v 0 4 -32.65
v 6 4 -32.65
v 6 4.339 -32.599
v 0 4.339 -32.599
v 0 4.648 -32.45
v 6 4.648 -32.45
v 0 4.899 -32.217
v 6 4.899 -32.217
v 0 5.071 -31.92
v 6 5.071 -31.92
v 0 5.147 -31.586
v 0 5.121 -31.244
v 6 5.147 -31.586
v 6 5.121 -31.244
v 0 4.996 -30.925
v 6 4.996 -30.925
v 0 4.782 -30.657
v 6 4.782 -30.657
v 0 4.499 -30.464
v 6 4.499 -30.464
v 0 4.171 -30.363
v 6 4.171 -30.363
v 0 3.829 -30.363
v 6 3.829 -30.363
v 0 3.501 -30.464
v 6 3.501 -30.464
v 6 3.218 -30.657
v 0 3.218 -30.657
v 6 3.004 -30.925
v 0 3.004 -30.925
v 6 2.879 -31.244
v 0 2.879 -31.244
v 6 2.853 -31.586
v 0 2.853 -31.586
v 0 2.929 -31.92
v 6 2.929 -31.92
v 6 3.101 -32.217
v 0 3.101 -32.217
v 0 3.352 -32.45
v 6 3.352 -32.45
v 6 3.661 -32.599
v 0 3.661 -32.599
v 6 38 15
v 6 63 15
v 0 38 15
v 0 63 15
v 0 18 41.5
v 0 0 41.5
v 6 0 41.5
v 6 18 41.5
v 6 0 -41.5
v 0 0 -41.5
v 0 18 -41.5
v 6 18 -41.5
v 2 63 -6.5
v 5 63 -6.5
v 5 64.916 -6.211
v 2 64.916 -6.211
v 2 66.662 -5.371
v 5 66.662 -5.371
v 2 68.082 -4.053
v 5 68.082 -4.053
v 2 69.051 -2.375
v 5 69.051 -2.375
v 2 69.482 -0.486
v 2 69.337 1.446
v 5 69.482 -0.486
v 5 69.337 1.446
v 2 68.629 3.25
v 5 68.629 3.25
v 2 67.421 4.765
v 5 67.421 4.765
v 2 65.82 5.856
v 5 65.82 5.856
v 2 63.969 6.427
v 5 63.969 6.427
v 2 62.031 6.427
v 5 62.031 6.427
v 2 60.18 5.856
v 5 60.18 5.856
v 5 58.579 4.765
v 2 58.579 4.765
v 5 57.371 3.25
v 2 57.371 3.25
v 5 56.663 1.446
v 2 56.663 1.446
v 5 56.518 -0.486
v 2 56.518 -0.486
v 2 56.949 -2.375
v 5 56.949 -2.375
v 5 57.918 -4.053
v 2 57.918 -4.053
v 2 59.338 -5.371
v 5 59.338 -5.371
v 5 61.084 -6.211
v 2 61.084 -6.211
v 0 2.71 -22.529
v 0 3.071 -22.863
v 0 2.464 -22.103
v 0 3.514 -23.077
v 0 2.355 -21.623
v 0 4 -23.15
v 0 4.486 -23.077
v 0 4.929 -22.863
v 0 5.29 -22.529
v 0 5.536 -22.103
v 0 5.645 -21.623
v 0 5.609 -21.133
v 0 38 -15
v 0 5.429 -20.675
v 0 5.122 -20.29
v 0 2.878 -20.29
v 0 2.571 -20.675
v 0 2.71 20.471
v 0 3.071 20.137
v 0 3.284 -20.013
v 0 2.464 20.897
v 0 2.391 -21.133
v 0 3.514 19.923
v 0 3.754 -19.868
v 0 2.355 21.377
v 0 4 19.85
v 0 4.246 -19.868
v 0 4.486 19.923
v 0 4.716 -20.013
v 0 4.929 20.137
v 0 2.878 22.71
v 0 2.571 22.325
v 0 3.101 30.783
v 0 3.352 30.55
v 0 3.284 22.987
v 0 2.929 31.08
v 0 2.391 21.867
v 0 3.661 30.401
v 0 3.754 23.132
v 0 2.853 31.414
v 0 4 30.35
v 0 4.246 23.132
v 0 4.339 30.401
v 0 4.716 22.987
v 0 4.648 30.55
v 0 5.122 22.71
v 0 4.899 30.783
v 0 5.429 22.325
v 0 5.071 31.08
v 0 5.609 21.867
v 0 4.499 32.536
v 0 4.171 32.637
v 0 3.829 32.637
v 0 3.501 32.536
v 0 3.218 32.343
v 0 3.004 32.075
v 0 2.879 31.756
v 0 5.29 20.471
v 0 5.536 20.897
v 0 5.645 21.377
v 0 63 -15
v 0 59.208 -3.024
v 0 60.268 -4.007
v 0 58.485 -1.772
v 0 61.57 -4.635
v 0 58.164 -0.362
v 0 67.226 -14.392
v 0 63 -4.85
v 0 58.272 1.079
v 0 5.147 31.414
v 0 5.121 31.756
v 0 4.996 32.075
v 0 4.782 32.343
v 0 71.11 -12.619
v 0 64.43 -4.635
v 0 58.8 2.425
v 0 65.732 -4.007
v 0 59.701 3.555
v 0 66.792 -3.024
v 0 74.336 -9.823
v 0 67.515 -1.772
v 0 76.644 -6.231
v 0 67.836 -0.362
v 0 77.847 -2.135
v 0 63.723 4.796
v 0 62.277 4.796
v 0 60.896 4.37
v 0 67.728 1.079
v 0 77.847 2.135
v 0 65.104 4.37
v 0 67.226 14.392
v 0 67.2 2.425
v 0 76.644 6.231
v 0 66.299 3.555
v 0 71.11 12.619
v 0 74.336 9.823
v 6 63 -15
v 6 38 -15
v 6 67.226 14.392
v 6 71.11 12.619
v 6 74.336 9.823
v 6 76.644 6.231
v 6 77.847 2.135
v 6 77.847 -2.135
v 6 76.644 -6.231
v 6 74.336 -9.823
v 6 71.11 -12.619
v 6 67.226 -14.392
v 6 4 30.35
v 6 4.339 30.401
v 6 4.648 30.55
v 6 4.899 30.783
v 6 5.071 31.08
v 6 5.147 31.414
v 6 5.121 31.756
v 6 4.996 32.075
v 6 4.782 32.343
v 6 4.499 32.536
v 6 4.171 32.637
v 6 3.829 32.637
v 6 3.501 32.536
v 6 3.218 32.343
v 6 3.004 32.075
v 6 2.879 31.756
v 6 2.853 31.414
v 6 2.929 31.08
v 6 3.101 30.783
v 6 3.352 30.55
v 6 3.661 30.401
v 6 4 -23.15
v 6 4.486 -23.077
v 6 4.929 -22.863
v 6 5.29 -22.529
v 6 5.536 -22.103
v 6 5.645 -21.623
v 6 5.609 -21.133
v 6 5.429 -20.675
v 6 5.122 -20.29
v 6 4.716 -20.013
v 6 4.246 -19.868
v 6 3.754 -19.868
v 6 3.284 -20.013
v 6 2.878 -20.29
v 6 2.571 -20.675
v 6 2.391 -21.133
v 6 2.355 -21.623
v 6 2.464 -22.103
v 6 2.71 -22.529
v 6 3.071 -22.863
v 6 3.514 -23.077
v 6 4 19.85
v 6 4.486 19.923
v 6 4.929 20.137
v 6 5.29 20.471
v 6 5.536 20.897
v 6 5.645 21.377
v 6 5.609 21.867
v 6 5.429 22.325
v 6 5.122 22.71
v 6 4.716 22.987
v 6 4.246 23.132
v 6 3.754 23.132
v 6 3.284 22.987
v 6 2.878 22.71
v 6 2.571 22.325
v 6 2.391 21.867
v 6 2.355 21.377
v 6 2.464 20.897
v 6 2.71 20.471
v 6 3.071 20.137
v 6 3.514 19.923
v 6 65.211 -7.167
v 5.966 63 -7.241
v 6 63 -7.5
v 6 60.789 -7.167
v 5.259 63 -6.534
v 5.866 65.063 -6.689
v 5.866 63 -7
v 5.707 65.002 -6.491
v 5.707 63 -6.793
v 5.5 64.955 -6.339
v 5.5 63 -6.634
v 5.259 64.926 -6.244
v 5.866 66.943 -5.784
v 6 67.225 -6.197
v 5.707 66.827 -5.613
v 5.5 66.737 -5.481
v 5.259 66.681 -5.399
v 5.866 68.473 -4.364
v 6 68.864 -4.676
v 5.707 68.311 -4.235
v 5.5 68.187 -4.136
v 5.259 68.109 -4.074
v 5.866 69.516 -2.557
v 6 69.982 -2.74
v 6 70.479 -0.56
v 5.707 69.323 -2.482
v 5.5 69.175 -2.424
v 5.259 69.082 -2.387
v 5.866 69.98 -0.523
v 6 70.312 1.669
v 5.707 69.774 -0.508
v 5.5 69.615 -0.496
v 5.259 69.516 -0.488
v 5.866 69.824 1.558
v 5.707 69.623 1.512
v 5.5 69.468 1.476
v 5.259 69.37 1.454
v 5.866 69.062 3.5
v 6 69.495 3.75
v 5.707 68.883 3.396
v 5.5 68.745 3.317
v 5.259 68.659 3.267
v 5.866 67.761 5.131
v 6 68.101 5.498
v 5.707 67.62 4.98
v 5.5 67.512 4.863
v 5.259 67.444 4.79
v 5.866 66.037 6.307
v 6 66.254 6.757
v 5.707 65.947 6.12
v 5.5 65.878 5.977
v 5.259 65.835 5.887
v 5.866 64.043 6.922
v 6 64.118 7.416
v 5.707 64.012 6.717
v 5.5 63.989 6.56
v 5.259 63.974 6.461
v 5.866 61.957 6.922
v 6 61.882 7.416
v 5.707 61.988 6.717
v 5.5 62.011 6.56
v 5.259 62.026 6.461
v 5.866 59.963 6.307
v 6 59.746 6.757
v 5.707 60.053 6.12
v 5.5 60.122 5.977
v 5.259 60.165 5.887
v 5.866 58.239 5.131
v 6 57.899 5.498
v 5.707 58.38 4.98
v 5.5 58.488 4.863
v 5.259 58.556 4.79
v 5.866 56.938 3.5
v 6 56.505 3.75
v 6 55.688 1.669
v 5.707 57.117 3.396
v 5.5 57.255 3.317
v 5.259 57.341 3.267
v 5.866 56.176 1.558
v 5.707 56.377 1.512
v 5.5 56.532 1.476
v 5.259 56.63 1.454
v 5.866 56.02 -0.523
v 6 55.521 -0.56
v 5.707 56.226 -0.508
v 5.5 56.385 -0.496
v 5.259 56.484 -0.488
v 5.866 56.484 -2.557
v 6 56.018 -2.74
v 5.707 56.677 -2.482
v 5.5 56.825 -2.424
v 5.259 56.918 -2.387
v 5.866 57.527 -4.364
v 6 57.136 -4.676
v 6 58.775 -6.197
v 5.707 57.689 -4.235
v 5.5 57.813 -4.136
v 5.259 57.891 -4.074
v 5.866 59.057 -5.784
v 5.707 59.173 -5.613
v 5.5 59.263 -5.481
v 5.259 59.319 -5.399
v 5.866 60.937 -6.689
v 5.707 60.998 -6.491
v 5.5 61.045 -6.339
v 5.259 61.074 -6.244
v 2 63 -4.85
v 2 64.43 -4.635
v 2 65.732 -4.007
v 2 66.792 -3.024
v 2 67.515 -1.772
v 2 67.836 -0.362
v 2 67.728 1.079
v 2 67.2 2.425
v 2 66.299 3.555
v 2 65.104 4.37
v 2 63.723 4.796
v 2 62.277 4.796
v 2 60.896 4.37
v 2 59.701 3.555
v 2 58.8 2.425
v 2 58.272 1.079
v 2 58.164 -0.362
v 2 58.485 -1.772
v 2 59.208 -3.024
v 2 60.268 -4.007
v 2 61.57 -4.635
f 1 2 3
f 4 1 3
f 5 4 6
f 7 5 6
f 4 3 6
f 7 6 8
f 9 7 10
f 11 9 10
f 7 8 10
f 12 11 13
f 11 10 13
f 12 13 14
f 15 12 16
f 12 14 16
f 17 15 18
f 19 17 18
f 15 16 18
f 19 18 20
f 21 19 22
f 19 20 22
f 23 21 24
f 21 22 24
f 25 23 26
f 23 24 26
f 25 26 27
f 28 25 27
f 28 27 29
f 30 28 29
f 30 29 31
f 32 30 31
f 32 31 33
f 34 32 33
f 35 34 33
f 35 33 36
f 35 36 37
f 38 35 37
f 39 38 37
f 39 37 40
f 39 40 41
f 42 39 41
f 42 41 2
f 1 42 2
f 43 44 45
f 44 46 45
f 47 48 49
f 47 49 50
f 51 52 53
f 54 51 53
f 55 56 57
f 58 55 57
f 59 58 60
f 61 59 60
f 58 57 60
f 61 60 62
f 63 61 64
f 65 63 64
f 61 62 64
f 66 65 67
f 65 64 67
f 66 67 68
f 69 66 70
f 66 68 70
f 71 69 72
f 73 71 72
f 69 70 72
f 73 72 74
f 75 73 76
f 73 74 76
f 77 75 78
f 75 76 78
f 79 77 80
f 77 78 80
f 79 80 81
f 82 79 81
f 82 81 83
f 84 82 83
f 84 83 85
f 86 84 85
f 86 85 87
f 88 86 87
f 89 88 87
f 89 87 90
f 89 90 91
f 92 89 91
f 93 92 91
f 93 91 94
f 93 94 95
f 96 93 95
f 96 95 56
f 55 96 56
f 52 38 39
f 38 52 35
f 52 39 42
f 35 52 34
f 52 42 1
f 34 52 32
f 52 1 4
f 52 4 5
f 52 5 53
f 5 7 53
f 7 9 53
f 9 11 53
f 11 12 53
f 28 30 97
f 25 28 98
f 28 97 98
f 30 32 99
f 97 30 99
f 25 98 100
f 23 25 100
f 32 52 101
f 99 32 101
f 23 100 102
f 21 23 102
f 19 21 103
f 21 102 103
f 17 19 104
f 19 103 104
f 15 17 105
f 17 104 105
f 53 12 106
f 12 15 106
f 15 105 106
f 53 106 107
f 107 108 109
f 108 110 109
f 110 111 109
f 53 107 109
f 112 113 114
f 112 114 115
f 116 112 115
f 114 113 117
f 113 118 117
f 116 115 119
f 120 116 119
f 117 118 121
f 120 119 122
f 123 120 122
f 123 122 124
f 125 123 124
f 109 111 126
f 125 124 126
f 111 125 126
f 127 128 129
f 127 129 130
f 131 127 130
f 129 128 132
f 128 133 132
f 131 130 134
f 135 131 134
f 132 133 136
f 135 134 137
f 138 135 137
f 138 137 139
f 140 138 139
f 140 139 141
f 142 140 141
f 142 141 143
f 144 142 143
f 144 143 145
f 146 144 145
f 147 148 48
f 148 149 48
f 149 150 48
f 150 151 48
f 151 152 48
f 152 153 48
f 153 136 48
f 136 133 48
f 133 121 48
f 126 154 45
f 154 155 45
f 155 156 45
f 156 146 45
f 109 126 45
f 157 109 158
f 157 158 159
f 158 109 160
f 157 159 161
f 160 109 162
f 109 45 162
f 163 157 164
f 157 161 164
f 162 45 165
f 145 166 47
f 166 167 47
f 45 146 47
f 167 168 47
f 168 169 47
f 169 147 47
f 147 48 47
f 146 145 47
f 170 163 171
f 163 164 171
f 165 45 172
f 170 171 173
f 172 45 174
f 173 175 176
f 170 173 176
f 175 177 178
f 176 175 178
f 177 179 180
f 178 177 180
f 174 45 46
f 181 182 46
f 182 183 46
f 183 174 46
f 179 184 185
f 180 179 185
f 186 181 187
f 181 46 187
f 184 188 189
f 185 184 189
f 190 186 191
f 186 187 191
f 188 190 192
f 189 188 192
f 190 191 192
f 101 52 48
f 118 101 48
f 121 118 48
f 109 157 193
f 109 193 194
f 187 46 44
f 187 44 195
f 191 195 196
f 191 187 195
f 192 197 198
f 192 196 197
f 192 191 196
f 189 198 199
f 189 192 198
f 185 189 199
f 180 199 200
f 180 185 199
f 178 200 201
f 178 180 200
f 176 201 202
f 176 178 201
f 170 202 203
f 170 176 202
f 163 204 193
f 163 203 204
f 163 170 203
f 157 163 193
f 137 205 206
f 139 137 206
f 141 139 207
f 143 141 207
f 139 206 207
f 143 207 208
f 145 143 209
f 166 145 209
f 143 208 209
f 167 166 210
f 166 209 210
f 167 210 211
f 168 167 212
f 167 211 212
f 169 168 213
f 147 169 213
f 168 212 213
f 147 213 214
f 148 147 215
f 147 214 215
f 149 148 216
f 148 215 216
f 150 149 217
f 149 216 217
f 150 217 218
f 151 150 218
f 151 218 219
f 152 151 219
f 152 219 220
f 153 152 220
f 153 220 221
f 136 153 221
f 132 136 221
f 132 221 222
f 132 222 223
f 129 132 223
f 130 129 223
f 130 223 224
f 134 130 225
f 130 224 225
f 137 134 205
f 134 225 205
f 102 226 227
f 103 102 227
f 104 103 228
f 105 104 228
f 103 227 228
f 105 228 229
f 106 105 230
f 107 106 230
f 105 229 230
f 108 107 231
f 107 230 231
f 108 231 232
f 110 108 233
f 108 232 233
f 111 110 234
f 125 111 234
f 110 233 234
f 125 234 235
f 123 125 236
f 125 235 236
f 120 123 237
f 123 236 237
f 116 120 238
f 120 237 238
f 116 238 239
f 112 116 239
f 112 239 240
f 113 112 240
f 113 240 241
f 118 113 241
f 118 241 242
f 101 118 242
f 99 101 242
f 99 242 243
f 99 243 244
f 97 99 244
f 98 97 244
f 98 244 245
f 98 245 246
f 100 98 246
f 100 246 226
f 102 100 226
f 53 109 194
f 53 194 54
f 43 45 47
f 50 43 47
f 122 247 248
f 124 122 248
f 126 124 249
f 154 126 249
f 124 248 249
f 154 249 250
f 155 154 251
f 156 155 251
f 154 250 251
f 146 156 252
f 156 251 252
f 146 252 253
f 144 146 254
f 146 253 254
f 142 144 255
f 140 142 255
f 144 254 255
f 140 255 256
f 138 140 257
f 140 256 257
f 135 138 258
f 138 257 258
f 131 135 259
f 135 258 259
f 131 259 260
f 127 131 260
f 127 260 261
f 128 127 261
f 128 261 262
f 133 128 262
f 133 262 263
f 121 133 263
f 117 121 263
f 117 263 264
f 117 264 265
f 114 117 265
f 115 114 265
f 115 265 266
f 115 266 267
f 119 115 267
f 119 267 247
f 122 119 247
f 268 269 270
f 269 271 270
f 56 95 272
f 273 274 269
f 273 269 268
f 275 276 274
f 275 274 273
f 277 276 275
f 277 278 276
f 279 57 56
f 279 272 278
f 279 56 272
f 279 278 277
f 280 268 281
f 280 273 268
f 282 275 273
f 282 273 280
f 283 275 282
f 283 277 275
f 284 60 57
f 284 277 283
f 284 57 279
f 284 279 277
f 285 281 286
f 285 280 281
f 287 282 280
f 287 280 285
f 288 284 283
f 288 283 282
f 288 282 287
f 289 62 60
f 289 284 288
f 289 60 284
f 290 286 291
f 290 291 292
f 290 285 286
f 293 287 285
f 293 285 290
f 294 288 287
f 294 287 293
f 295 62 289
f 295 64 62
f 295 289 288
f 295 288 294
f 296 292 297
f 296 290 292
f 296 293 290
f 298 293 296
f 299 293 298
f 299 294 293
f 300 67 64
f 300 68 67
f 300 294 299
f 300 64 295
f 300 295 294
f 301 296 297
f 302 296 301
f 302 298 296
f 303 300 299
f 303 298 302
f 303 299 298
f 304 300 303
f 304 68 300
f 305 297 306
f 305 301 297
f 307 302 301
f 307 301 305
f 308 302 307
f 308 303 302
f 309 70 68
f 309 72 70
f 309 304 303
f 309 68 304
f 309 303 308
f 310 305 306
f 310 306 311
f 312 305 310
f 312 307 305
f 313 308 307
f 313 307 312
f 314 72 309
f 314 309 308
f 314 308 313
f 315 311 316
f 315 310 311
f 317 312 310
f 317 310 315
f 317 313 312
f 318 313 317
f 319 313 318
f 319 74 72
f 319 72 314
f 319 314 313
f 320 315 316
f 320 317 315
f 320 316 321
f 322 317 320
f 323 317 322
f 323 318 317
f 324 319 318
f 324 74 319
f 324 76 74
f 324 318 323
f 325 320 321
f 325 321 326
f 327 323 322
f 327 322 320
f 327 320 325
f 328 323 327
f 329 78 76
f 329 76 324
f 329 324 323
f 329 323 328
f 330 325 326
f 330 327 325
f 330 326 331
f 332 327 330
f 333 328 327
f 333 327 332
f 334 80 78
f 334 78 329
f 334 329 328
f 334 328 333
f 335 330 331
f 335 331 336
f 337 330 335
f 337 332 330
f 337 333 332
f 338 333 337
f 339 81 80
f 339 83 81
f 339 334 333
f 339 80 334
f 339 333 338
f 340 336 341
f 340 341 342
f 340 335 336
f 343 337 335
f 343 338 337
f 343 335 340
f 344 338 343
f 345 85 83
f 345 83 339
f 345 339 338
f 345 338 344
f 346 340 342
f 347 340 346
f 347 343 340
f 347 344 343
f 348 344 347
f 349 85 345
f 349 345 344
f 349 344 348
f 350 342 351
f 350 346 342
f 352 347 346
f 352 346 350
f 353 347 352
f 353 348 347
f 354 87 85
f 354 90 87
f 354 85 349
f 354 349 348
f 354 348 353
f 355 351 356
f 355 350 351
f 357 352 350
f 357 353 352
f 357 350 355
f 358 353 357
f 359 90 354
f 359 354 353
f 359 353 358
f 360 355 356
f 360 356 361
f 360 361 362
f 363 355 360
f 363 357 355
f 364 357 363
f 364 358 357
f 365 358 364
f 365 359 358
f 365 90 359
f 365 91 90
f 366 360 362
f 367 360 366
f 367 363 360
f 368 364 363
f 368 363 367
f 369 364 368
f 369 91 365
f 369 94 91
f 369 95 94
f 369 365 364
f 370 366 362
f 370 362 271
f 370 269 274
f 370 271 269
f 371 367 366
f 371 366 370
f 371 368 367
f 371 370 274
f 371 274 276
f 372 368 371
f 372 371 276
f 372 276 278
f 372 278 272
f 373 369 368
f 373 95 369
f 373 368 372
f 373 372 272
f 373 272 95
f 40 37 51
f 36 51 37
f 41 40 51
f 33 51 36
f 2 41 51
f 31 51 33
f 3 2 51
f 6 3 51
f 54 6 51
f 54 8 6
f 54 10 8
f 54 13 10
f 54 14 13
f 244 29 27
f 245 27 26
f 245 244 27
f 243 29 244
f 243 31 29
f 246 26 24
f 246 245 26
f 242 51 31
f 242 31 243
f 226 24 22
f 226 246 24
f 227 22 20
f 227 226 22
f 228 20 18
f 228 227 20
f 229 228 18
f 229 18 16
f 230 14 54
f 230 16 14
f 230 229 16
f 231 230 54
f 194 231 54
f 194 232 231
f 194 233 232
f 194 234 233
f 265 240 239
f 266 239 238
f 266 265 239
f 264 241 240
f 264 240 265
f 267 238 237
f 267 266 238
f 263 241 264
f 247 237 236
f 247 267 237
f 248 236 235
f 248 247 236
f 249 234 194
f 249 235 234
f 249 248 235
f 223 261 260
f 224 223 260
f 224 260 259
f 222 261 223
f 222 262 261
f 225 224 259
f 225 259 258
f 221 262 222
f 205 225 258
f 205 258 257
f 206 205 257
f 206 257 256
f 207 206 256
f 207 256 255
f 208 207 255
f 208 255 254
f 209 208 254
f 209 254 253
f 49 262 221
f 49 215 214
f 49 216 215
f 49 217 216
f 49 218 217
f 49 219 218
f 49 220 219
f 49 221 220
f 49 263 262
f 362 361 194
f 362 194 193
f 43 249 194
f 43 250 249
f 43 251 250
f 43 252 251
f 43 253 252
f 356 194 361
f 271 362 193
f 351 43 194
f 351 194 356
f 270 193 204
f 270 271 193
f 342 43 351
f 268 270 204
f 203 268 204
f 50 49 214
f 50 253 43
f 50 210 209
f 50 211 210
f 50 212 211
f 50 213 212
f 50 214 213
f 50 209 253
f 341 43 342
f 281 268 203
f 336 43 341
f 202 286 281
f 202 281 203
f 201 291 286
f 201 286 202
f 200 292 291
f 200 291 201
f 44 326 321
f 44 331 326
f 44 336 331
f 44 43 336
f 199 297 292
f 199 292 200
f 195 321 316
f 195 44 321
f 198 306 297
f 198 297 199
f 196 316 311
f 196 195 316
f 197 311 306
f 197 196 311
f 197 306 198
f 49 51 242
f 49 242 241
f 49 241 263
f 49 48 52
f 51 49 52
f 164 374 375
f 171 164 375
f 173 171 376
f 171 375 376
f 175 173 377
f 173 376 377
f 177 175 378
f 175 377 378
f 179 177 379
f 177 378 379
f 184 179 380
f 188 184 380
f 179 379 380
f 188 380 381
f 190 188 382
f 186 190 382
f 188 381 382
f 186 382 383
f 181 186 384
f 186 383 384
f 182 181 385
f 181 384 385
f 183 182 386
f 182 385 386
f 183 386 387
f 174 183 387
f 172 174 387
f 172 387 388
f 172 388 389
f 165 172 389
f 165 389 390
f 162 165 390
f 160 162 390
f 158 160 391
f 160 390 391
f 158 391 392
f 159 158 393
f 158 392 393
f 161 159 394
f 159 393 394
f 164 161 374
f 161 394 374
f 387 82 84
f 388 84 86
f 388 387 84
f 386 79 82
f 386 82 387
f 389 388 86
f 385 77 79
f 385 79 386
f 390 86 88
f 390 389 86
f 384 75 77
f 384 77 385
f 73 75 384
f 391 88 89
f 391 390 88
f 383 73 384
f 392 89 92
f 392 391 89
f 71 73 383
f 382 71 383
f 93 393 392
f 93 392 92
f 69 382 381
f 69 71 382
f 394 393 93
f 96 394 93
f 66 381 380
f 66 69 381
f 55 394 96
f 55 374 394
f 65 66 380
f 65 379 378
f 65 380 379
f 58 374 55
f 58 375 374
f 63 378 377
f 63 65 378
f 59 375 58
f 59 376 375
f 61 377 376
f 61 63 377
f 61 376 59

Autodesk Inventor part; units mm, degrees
ref_plane "YZ Plane" through (0, 0, 0) normal (1, 0, 0) x (0, 1, 0)
ref_plane "XZ Plane" through (0, 0, 0) normal (0, 1, 0) x (-1, 0, 0)
ref_plane "XY Plane" through (0, 0, 0) normal (0, 0, 1) x (1, 0, 0)
sketch "스케치1" plane through (0, 0, 0) normal (1, 0, 0) x (0, 1, 0)
  line L0 (0, -41.5) -> (18, -41.5)
  line L1 (18, -41.5) -> (18, 59.6584) construction
  line L2 (0, 0) -> (0, -41.5)
  line L3 (84.3904, 0) -> (-15.1692, 0) construction
  arc A0 (63, -15) -> (78, 0) centre (63, 0) ccw
  line L4 (63, -15) -> (38, -15)
  line L5 (38, -15) -> (18, -41.5)
  line L6 (0, 41.5) -> (18, 41.5)
  line L7 (0, 0) -> (0, 41.5)
  arc A1 (78, 0) -> (63, 15) centre (63, 0) ccw
  line L8 (63, 15) -> (38, 15)
  line L9 (38, 15) -> (18, 41.5)
  dimension "d0" = 18
  dimension "d8" = 45
  dimension "d9" = 25
extrude "돌출1" add sketch "스케치1" along normal blind 6
sketch "스케치2" plane through (6, 0, 0) normal (1, 0, 0) x (0, 0, -1)
  line L0 (-58.8675, 4) -> (65.7315, 4) construction
  line L1 (-41.5, 0) -> (41.5, 0) projected
  circle A0 centre (31.5, 4) radius 1.15
  circle A1 centre (21.5, 4) radius 1.65
  line L2 (41.5, 0) -> (41.5, 18) projected
  line L3 (0, 13.8041) -> (0, -7.7982) construction
  circle A2 centre (-31.5, 4) radius 1.15
  circle A3 centre (-21.5, 4) radius 1.65
  point P0 (0, 0)
  dimension "d12" = 4
  dimension "d13" = 2.3
  dimension "d14" = 3.3
  dimension "d15" = 10
  dimension "d16" = 20
extrude "돌출2" cut sketch "스케치2" against normal blind 6
sketch "스케치4" plane through (6, 0, 0) normal (1, 0, 0) x (0, 0, -1)
  arc A0 (15, 63) -> (-15, 63) centre (0, 63) ccw projected
  circle A1 centre (0, 63) radius 6.5
  point P0 (0, 0)
  dimension "d25" = 13
extrude "돌출4" cut sketch "스케치4" against normal blind 4
sketch "스케치5" plane through (2, 63, 0) normal (1, 0, 0) x (0, 0, -1)
  circle A0 centre (0, 0) radius 4.85
  point P0 (0, -63)
  dimension "d28" = 9.7
extrude "돌출5" cut sketch "스케치5" against normal blind 2
fillet "모깎기1" radius 1 1 edges at (6, 63, 6.5)
properties part number "탑(옆면수정)"
